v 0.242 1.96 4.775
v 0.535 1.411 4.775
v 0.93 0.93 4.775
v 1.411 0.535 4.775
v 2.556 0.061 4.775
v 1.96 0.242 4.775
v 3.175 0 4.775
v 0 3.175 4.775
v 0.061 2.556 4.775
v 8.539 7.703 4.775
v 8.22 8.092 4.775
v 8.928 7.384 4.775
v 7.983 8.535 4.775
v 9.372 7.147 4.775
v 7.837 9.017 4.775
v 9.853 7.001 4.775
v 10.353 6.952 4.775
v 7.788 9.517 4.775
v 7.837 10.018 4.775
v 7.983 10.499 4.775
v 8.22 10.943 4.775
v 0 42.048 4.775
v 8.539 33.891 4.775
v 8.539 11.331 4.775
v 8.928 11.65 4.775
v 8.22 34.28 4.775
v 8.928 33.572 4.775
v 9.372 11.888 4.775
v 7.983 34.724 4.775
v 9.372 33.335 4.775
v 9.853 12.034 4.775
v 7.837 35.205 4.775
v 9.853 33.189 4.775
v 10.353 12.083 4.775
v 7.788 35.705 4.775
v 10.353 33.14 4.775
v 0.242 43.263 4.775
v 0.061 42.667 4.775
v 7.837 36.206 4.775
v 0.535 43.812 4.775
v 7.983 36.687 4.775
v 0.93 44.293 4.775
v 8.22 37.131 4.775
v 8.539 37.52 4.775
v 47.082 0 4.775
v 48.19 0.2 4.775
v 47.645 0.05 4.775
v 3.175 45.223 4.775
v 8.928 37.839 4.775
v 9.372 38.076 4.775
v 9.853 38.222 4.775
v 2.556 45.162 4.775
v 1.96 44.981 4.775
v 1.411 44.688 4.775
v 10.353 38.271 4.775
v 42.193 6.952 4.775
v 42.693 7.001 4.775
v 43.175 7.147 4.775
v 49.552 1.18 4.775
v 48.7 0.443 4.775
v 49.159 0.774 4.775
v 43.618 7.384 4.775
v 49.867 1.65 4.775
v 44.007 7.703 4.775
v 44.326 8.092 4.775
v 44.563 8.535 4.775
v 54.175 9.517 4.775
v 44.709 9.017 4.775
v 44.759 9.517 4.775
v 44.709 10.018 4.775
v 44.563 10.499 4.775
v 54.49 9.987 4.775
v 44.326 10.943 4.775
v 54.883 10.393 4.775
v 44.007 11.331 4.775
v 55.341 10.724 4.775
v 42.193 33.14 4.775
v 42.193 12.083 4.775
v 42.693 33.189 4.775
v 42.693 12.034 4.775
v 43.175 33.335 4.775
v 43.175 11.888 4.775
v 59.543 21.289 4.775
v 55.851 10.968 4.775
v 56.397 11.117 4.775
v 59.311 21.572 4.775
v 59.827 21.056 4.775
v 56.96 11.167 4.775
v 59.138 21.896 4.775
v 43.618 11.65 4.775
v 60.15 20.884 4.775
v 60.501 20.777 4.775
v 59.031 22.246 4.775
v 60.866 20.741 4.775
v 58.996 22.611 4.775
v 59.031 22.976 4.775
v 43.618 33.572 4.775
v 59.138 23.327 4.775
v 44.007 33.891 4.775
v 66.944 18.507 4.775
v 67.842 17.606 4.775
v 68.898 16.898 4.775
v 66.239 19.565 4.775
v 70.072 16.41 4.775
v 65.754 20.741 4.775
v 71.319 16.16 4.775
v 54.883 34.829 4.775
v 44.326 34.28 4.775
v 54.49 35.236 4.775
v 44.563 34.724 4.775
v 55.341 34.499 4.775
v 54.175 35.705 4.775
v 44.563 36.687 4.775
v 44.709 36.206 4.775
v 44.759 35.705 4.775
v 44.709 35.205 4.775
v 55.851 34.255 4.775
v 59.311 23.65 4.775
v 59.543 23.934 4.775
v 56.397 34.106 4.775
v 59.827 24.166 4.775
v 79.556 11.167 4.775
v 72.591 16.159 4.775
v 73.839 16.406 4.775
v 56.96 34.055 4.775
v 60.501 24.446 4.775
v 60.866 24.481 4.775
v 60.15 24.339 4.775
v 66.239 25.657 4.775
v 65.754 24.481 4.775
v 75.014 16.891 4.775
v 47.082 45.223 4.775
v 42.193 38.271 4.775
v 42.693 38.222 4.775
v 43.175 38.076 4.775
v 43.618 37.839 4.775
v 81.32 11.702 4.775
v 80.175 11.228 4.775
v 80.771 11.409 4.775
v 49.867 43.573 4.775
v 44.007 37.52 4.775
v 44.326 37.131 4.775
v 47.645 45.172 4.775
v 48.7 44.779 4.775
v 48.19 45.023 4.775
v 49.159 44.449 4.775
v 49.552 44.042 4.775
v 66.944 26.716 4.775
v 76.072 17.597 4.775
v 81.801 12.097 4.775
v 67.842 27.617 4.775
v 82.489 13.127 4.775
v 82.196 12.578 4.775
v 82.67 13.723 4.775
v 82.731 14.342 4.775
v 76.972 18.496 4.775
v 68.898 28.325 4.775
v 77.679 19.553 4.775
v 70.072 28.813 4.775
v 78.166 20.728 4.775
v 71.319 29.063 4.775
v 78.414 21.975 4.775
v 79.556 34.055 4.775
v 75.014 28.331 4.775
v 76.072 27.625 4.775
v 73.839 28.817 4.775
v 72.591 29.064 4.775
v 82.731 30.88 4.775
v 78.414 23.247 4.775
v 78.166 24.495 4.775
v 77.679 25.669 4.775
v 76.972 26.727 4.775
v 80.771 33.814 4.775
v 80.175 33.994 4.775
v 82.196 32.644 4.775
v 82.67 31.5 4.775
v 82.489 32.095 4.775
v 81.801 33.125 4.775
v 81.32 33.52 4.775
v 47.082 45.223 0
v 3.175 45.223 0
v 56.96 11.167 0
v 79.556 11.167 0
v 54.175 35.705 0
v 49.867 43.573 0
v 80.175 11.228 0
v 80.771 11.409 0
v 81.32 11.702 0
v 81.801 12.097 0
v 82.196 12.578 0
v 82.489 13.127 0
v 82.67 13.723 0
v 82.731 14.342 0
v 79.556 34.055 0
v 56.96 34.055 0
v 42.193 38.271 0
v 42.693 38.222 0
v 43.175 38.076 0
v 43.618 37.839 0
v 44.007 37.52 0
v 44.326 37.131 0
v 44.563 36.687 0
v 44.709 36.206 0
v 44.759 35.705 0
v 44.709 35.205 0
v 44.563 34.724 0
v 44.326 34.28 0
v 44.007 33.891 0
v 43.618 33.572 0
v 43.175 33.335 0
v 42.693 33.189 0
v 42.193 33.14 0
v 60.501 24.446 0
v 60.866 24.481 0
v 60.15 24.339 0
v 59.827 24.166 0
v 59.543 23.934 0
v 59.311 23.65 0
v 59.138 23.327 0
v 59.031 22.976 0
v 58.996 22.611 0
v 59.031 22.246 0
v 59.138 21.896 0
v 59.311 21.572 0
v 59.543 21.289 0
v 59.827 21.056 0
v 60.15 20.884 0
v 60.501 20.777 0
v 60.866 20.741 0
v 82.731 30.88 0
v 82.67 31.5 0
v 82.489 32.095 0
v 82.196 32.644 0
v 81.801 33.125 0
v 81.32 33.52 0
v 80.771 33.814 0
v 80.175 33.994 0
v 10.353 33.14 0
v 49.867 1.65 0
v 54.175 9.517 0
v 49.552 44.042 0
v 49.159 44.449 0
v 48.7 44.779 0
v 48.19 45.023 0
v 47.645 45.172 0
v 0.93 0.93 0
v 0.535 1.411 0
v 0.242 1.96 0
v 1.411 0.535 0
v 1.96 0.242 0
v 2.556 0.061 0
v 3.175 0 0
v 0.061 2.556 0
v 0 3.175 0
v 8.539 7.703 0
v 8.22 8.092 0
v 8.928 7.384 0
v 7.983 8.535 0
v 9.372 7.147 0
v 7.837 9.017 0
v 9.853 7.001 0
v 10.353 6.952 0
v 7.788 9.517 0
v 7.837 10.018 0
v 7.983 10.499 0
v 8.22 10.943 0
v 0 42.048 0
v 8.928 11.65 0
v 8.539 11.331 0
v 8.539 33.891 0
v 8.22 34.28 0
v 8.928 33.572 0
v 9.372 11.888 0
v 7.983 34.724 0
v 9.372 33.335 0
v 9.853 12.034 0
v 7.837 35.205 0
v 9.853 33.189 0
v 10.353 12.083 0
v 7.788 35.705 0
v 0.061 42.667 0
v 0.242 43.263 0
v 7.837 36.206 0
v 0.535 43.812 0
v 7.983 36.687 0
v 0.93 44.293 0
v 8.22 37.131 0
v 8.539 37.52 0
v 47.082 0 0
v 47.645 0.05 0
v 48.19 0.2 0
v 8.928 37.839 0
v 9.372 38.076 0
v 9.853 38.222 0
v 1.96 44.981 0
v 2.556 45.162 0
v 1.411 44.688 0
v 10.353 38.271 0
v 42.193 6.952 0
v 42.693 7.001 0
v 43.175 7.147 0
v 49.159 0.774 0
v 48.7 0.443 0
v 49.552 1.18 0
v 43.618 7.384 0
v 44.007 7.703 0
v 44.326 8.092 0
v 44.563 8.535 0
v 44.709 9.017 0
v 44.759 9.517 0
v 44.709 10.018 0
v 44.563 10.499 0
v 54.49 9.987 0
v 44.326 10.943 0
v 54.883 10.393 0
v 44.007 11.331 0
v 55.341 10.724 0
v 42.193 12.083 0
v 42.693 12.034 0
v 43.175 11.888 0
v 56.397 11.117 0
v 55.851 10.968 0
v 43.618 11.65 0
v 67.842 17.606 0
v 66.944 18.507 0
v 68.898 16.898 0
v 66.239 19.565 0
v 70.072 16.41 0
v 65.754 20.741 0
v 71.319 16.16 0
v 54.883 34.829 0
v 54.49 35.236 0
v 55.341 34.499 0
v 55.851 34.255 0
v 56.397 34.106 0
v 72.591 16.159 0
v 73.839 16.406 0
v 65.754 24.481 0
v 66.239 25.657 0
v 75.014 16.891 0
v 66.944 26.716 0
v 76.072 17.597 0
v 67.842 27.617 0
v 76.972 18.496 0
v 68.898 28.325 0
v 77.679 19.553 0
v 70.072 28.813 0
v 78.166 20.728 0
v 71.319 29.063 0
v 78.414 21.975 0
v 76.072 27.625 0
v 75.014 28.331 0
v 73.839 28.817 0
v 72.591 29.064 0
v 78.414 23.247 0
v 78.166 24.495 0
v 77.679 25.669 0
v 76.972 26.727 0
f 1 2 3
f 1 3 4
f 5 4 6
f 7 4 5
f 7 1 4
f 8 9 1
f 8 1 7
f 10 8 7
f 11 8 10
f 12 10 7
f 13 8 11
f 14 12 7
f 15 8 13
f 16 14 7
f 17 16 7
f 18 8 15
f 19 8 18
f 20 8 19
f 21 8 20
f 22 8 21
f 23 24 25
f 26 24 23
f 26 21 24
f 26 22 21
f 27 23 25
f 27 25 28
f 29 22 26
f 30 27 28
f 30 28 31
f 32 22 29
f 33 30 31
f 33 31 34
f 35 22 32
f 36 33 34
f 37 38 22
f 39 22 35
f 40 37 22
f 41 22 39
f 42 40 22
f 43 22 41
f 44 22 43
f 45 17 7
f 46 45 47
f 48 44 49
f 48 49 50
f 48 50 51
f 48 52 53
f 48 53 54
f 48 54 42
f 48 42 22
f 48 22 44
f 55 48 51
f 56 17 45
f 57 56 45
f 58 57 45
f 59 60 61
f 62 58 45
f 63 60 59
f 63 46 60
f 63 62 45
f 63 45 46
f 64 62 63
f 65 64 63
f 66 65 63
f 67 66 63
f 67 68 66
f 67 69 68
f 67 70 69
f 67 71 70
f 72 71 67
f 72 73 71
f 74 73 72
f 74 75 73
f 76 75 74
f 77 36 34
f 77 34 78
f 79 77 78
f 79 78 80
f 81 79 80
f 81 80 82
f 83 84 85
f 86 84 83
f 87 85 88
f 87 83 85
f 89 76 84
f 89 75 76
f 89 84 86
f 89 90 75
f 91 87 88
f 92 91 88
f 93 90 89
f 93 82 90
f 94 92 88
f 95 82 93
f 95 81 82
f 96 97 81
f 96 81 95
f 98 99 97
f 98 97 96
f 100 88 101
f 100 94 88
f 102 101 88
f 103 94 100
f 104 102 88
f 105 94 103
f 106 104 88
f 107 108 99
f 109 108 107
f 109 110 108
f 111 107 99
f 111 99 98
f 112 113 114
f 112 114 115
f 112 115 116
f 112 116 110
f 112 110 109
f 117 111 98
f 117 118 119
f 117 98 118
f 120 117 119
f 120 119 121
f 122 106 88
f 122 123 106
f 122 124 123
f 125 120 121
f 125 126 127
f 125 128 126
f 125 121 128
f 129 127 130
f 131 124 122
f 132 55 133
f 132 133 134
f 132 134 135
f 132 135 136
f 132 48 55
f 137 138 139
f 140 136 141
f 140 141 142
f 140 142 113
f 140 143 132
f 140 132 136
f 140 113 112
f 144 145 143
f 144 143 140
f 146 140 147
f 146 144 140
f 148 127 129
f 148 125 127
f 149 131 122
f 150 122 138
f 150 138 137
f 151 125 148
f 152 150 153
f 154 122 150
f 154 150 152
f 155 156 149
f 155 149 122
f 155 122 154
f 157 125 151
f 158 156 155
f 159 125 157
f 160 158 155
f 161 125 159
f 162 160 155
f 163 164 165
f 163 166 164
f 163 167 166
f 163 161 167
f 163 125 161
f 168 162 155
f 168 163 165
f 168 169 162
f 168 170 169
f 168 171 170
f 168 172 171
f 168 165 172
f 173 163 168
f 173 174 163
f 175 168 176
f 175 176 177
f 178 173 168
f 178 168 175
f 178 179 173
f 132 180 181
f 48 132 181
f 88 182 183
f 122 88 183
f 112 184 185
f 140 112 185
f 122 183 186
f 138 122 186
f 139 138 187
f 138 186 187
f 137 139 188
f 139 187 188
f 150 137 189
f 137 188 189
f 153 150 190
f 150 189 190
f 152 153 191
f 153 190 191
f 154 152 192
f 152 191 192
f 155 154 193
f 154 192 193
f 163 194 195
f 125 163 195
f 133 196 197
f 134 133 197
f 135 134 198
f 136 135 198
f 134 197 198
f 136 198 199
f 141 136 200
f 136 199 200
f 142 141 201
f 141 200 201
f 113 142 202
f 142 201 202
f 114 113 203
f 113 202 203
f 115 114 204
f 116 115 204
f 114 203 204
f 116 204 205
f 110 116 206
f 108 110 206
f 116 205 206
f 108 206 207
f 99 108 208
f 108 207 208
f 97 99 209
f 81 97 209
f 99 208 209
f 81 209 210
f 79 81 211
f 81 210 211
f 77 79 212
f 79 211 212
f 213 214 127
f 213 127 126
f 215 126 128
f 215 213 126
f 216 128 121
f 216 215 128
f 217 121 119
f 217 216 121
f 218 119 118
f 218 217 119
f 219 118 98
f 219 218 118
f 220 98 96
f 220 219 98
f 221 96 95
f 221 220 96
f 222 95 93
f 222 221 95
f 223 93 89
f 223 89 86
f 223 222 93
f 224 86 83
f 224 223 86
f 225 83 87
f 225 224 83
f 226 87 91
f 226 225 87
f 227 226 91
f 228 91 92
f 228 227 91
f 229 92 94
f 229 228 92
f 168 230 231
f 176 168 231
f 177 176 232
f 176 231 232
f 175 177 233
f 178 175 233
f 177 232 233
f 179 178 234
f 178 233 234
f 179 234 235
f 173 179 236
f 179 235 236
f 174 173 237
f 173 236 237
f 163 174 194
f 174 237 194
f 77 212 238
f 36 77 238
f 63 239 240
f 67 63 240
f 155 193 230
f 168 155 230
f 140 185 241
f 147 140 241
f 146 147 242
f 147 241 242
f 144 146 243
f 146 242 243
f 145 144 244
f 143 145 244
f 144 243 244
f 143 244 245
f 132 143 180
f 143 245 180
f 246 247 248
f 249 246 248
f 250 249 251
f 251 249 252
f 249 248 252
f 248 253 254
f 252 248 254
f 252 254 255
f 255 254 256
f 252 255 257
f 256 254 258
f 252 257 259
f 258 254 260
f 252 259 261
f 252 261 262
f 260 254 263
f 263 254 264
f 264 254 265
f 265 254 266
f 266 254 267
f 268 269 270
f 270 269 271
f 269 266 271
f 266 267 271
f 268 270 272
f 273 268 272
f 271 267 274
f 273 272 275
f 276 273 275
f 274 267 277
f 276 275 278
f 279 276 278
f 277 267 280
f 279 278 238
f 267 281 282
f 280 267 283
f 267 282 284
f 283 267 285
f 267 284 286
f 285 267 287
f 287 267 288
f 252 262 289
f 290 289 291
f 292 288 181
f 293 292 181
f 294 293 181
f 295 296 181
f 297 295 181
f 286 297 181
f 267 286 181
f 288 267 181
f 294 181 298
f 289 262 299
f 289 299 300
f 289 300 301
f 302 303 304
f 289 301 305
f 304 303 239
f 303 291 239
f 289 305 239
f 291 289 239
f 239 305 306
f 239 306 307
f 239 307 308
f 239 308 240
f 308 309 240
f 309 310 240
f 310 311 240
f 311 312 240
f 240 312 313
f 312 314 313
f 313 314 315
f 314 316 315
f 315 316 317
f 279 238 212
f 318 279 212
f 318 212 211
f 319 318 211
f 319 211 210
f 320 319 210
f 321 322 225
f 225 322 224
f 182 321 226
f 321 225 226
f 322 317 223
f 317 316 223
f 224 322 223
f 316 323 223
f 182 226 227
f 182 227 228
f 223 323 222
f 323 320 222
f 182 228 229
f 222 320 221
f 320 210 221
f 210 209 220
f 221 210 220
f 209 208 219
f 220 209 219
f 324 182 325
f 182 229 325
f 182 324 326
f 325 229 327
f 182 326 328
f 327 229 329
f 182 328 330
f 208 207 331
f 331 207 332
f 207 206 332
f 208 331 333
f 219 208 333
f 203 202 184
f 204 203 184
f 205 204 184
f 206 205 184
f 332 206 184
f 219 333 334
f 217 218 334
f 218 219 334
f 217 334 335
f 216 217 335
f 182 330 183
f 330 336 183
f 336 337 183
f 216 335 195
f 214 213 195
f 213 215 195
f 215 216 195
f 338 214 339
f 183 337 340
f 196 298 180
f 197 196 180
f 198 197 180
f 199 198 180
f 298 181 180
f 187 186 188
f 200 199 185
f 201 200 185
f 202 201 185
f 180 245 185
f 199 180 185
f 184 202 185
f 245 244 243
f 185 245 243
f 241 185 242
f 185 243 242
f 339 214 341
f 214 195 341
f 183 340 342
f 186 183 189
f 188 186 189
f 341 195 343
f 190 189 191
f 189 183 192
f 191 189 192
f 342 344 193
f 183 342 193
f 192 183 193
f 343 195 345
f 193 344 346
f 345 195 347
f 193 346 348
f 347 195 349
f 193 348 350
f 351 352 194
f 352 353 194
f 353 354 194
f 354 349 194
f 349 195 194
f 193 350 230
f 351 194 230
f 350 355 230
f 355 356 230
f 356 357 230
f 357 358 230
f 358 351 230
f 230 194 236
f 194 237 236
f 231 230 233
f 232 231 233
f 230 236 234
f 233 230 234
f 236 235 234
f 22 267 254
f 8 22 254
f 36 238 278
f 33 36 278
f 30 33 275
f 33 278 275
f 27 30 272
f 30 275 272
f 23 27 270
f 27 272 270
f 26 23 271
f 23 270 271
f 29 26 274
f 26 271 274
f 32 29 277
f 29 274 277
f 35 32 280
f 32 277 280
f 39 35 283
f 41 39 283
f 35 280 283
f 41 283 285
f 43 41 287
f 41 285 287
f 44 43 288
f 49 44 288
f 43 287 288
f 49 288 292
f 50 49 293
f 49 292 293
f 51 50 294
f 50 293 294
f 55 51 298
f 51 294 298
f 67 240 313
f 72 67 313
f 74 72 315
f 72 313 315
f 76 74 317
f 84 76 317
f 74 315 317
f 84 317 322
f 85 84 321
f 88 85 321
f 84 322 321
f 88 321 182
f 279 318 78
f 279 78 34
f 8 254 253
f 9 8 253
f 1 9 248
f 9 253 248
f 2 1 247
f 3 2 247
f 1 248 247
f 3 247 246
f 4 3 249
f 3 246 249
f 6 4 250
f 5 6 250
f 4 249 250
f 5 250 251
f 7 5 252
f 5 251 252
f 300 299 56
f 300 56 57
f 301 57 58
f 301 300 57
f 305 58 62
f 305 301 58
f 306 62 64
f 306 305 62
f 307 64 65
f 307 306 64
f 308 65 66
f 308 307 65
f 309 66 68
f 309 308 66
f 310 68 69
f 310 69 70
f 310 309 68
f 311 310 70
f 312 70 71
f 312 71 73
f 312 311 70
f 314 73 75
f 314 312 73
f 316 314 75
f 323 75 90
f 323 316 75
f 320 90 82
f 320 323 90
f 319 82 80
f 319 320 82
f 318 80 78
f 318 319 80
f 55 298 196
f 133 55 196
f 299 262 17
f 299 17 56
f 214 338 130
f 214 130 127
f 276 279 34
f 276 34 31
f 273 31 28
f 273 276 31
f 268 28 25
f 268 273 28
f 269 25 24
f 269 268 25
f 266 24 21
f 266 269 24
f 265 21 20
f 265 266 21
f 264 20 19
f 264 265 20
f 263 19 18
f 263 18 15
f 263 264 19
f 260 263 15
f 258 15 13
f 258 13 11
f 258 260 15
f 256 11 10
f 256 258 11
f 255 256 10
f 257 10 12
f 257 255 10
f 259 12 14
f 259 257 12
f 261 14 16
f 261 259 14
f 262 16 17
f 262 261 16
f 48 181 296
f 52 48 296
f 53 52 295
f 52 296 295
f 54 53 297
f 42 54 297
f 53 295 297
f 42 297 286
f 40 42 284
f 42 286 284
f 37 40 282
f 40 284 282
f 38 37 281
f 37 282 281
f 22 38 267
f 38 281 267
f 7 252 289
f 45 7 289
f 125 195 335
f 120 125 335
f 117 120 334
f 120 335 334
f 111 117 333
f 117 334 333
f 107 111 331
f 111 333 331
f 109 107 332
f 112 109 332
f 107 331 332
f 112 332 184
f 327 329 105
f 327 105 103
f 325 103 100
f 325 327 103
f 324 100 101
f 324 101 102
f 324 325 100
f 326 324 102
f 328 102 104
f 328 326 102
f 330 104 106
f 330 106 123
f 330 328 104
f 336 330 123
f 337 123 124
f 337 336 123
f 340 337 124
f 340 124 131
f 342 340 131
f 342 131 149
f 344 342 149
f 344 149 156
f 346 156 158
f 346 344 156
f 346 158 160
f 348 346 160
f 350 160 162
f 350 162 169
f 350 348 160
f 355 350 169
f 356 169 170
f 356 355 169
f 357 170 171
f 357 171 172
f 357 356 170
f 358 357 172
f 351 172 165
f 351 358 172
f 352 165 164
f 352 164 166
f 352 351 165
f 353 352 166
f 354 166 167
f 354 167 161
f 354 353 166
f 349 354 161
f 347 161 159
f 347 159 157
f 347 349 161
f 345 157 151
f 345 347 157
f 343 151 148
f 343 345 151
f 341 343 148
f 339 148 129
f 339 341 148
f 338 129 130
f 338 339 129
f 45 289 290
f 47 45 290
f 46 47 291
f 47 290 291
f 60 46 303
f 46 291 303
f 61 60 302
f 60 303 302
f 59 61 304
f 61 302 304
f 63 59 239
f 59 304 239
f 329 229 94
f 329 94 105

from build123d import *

# Parameters (mm, degrees)
EXTRUDE1_DEPTH = 4.7752


with BuildPart() as part:
    # Sketch1 → Extrude1 (new body)
    with BuildSketch(Plane.XY):
        with BuildLine():
            Line((0, 42.047652439), (0, 3.175))
            ThreePointArc((0, 3.175), (0.92993597, 0.92993597), (3.175, 0))
            Line((3.175, 0), (47.081976454, 0))
            ThreePointArc((47.081976454, 0), (48.700425311, 0.443471436), (49.866757105, 1.650001072))
            Line((49.866757105, 1.650001072), (54.175007162, 9.517240307))
            ThreePointArc((54.175007162, 9.517240307), (55.341338955, 10.723769944), (56.959787812, 11.167241379))
            Line((56.959787812, 11.167241379), (79.555795926, 11.167241379))
            ThreePointArc((79.555795926, 11.167241379), (81.800859957, 12.097177349), (82.730795926, 14.342241379))
            Line((82.730795926, 14.342241379), (82.730795926, 30.88041106))
            ThreePointArc((82.730795926, 30.88041106), (81.800859957, 33.12547509), (79.555795926, 34.05541106))
            Line((79.555795926, 34.05541106), (56.959787812, 34.05541106))
            ThreePointArc((56.959787812, 34.05541106), (55.341338955, 34.498882496), (54.175007162, 35.705412132))
            Line((54.175007162, 35.705412132), (49.866757105, 43.572651367))
            ThreePointArc((49.866757105, 43.572651367), (48.700425311, 44.779181004), (47.081976454, 45.222652439))
            Line((47.081976454, 45.222652439), (3.175, 45.222652439))
            ThreePointArc((3.175, 45.222652439), (0.92993597, 44.29271647), (0, 42.047652439))
        make_face()
        with BuildLine():
            Line((65.754365641, 24.481484037), (60.865717892, 24.481484037))
            ThreePointArc((60.865717892, 24.481484037), (58.995560075, 22.61132622), (60.865717892, 20.741168403))
            Line((60.865717892, 20.741168403), (65.754365641, 20.741168403))
            ThreePointArc((65.754365641, 20.741168403), (78.445201373, 22.61132622), (65.754365641, 24.481484037))
        make_face(mode=Mode.SUBTRACT)
        with BuildLine():
            Line((10.353425124, 38.271016828), (42.192963273, 38.271016828))
            ThreePointArc((42.192963273, 38.271016828), (44.758567969, 35.705412132), (42.192963273, 33.139807437))
            Line((42.192963273, 33.139807437), (10.353425124, 33.139807437))
            ThreePointArc((10.353425124, 33.139807437), (7.787820428, 35.705412132), (10.353425124, 38.271016828))
        make_face(mode=Mode.SUBTRACT)
        with BuildLine():
            Line((10.353425124, 6.951635611), (42.192963273, 6.951635611))
            ThreePointArc((42.192963273, 6.951635611), (44.758567969, 9.517240307), (42.192963273, 12.082845003))
            Line((42.192963273, 12.082845003), (10.353425124, 12.082845003))
            ThreePointArc((10.353425124, 12.082845003), (7.787820428, 9.517240307), (10.353425124, 6.951635611))
        make_face(mode=Mode.SUBTRACT)
    extrude(amount=EXTRUDE1_DEPTH)


solid = part.part
